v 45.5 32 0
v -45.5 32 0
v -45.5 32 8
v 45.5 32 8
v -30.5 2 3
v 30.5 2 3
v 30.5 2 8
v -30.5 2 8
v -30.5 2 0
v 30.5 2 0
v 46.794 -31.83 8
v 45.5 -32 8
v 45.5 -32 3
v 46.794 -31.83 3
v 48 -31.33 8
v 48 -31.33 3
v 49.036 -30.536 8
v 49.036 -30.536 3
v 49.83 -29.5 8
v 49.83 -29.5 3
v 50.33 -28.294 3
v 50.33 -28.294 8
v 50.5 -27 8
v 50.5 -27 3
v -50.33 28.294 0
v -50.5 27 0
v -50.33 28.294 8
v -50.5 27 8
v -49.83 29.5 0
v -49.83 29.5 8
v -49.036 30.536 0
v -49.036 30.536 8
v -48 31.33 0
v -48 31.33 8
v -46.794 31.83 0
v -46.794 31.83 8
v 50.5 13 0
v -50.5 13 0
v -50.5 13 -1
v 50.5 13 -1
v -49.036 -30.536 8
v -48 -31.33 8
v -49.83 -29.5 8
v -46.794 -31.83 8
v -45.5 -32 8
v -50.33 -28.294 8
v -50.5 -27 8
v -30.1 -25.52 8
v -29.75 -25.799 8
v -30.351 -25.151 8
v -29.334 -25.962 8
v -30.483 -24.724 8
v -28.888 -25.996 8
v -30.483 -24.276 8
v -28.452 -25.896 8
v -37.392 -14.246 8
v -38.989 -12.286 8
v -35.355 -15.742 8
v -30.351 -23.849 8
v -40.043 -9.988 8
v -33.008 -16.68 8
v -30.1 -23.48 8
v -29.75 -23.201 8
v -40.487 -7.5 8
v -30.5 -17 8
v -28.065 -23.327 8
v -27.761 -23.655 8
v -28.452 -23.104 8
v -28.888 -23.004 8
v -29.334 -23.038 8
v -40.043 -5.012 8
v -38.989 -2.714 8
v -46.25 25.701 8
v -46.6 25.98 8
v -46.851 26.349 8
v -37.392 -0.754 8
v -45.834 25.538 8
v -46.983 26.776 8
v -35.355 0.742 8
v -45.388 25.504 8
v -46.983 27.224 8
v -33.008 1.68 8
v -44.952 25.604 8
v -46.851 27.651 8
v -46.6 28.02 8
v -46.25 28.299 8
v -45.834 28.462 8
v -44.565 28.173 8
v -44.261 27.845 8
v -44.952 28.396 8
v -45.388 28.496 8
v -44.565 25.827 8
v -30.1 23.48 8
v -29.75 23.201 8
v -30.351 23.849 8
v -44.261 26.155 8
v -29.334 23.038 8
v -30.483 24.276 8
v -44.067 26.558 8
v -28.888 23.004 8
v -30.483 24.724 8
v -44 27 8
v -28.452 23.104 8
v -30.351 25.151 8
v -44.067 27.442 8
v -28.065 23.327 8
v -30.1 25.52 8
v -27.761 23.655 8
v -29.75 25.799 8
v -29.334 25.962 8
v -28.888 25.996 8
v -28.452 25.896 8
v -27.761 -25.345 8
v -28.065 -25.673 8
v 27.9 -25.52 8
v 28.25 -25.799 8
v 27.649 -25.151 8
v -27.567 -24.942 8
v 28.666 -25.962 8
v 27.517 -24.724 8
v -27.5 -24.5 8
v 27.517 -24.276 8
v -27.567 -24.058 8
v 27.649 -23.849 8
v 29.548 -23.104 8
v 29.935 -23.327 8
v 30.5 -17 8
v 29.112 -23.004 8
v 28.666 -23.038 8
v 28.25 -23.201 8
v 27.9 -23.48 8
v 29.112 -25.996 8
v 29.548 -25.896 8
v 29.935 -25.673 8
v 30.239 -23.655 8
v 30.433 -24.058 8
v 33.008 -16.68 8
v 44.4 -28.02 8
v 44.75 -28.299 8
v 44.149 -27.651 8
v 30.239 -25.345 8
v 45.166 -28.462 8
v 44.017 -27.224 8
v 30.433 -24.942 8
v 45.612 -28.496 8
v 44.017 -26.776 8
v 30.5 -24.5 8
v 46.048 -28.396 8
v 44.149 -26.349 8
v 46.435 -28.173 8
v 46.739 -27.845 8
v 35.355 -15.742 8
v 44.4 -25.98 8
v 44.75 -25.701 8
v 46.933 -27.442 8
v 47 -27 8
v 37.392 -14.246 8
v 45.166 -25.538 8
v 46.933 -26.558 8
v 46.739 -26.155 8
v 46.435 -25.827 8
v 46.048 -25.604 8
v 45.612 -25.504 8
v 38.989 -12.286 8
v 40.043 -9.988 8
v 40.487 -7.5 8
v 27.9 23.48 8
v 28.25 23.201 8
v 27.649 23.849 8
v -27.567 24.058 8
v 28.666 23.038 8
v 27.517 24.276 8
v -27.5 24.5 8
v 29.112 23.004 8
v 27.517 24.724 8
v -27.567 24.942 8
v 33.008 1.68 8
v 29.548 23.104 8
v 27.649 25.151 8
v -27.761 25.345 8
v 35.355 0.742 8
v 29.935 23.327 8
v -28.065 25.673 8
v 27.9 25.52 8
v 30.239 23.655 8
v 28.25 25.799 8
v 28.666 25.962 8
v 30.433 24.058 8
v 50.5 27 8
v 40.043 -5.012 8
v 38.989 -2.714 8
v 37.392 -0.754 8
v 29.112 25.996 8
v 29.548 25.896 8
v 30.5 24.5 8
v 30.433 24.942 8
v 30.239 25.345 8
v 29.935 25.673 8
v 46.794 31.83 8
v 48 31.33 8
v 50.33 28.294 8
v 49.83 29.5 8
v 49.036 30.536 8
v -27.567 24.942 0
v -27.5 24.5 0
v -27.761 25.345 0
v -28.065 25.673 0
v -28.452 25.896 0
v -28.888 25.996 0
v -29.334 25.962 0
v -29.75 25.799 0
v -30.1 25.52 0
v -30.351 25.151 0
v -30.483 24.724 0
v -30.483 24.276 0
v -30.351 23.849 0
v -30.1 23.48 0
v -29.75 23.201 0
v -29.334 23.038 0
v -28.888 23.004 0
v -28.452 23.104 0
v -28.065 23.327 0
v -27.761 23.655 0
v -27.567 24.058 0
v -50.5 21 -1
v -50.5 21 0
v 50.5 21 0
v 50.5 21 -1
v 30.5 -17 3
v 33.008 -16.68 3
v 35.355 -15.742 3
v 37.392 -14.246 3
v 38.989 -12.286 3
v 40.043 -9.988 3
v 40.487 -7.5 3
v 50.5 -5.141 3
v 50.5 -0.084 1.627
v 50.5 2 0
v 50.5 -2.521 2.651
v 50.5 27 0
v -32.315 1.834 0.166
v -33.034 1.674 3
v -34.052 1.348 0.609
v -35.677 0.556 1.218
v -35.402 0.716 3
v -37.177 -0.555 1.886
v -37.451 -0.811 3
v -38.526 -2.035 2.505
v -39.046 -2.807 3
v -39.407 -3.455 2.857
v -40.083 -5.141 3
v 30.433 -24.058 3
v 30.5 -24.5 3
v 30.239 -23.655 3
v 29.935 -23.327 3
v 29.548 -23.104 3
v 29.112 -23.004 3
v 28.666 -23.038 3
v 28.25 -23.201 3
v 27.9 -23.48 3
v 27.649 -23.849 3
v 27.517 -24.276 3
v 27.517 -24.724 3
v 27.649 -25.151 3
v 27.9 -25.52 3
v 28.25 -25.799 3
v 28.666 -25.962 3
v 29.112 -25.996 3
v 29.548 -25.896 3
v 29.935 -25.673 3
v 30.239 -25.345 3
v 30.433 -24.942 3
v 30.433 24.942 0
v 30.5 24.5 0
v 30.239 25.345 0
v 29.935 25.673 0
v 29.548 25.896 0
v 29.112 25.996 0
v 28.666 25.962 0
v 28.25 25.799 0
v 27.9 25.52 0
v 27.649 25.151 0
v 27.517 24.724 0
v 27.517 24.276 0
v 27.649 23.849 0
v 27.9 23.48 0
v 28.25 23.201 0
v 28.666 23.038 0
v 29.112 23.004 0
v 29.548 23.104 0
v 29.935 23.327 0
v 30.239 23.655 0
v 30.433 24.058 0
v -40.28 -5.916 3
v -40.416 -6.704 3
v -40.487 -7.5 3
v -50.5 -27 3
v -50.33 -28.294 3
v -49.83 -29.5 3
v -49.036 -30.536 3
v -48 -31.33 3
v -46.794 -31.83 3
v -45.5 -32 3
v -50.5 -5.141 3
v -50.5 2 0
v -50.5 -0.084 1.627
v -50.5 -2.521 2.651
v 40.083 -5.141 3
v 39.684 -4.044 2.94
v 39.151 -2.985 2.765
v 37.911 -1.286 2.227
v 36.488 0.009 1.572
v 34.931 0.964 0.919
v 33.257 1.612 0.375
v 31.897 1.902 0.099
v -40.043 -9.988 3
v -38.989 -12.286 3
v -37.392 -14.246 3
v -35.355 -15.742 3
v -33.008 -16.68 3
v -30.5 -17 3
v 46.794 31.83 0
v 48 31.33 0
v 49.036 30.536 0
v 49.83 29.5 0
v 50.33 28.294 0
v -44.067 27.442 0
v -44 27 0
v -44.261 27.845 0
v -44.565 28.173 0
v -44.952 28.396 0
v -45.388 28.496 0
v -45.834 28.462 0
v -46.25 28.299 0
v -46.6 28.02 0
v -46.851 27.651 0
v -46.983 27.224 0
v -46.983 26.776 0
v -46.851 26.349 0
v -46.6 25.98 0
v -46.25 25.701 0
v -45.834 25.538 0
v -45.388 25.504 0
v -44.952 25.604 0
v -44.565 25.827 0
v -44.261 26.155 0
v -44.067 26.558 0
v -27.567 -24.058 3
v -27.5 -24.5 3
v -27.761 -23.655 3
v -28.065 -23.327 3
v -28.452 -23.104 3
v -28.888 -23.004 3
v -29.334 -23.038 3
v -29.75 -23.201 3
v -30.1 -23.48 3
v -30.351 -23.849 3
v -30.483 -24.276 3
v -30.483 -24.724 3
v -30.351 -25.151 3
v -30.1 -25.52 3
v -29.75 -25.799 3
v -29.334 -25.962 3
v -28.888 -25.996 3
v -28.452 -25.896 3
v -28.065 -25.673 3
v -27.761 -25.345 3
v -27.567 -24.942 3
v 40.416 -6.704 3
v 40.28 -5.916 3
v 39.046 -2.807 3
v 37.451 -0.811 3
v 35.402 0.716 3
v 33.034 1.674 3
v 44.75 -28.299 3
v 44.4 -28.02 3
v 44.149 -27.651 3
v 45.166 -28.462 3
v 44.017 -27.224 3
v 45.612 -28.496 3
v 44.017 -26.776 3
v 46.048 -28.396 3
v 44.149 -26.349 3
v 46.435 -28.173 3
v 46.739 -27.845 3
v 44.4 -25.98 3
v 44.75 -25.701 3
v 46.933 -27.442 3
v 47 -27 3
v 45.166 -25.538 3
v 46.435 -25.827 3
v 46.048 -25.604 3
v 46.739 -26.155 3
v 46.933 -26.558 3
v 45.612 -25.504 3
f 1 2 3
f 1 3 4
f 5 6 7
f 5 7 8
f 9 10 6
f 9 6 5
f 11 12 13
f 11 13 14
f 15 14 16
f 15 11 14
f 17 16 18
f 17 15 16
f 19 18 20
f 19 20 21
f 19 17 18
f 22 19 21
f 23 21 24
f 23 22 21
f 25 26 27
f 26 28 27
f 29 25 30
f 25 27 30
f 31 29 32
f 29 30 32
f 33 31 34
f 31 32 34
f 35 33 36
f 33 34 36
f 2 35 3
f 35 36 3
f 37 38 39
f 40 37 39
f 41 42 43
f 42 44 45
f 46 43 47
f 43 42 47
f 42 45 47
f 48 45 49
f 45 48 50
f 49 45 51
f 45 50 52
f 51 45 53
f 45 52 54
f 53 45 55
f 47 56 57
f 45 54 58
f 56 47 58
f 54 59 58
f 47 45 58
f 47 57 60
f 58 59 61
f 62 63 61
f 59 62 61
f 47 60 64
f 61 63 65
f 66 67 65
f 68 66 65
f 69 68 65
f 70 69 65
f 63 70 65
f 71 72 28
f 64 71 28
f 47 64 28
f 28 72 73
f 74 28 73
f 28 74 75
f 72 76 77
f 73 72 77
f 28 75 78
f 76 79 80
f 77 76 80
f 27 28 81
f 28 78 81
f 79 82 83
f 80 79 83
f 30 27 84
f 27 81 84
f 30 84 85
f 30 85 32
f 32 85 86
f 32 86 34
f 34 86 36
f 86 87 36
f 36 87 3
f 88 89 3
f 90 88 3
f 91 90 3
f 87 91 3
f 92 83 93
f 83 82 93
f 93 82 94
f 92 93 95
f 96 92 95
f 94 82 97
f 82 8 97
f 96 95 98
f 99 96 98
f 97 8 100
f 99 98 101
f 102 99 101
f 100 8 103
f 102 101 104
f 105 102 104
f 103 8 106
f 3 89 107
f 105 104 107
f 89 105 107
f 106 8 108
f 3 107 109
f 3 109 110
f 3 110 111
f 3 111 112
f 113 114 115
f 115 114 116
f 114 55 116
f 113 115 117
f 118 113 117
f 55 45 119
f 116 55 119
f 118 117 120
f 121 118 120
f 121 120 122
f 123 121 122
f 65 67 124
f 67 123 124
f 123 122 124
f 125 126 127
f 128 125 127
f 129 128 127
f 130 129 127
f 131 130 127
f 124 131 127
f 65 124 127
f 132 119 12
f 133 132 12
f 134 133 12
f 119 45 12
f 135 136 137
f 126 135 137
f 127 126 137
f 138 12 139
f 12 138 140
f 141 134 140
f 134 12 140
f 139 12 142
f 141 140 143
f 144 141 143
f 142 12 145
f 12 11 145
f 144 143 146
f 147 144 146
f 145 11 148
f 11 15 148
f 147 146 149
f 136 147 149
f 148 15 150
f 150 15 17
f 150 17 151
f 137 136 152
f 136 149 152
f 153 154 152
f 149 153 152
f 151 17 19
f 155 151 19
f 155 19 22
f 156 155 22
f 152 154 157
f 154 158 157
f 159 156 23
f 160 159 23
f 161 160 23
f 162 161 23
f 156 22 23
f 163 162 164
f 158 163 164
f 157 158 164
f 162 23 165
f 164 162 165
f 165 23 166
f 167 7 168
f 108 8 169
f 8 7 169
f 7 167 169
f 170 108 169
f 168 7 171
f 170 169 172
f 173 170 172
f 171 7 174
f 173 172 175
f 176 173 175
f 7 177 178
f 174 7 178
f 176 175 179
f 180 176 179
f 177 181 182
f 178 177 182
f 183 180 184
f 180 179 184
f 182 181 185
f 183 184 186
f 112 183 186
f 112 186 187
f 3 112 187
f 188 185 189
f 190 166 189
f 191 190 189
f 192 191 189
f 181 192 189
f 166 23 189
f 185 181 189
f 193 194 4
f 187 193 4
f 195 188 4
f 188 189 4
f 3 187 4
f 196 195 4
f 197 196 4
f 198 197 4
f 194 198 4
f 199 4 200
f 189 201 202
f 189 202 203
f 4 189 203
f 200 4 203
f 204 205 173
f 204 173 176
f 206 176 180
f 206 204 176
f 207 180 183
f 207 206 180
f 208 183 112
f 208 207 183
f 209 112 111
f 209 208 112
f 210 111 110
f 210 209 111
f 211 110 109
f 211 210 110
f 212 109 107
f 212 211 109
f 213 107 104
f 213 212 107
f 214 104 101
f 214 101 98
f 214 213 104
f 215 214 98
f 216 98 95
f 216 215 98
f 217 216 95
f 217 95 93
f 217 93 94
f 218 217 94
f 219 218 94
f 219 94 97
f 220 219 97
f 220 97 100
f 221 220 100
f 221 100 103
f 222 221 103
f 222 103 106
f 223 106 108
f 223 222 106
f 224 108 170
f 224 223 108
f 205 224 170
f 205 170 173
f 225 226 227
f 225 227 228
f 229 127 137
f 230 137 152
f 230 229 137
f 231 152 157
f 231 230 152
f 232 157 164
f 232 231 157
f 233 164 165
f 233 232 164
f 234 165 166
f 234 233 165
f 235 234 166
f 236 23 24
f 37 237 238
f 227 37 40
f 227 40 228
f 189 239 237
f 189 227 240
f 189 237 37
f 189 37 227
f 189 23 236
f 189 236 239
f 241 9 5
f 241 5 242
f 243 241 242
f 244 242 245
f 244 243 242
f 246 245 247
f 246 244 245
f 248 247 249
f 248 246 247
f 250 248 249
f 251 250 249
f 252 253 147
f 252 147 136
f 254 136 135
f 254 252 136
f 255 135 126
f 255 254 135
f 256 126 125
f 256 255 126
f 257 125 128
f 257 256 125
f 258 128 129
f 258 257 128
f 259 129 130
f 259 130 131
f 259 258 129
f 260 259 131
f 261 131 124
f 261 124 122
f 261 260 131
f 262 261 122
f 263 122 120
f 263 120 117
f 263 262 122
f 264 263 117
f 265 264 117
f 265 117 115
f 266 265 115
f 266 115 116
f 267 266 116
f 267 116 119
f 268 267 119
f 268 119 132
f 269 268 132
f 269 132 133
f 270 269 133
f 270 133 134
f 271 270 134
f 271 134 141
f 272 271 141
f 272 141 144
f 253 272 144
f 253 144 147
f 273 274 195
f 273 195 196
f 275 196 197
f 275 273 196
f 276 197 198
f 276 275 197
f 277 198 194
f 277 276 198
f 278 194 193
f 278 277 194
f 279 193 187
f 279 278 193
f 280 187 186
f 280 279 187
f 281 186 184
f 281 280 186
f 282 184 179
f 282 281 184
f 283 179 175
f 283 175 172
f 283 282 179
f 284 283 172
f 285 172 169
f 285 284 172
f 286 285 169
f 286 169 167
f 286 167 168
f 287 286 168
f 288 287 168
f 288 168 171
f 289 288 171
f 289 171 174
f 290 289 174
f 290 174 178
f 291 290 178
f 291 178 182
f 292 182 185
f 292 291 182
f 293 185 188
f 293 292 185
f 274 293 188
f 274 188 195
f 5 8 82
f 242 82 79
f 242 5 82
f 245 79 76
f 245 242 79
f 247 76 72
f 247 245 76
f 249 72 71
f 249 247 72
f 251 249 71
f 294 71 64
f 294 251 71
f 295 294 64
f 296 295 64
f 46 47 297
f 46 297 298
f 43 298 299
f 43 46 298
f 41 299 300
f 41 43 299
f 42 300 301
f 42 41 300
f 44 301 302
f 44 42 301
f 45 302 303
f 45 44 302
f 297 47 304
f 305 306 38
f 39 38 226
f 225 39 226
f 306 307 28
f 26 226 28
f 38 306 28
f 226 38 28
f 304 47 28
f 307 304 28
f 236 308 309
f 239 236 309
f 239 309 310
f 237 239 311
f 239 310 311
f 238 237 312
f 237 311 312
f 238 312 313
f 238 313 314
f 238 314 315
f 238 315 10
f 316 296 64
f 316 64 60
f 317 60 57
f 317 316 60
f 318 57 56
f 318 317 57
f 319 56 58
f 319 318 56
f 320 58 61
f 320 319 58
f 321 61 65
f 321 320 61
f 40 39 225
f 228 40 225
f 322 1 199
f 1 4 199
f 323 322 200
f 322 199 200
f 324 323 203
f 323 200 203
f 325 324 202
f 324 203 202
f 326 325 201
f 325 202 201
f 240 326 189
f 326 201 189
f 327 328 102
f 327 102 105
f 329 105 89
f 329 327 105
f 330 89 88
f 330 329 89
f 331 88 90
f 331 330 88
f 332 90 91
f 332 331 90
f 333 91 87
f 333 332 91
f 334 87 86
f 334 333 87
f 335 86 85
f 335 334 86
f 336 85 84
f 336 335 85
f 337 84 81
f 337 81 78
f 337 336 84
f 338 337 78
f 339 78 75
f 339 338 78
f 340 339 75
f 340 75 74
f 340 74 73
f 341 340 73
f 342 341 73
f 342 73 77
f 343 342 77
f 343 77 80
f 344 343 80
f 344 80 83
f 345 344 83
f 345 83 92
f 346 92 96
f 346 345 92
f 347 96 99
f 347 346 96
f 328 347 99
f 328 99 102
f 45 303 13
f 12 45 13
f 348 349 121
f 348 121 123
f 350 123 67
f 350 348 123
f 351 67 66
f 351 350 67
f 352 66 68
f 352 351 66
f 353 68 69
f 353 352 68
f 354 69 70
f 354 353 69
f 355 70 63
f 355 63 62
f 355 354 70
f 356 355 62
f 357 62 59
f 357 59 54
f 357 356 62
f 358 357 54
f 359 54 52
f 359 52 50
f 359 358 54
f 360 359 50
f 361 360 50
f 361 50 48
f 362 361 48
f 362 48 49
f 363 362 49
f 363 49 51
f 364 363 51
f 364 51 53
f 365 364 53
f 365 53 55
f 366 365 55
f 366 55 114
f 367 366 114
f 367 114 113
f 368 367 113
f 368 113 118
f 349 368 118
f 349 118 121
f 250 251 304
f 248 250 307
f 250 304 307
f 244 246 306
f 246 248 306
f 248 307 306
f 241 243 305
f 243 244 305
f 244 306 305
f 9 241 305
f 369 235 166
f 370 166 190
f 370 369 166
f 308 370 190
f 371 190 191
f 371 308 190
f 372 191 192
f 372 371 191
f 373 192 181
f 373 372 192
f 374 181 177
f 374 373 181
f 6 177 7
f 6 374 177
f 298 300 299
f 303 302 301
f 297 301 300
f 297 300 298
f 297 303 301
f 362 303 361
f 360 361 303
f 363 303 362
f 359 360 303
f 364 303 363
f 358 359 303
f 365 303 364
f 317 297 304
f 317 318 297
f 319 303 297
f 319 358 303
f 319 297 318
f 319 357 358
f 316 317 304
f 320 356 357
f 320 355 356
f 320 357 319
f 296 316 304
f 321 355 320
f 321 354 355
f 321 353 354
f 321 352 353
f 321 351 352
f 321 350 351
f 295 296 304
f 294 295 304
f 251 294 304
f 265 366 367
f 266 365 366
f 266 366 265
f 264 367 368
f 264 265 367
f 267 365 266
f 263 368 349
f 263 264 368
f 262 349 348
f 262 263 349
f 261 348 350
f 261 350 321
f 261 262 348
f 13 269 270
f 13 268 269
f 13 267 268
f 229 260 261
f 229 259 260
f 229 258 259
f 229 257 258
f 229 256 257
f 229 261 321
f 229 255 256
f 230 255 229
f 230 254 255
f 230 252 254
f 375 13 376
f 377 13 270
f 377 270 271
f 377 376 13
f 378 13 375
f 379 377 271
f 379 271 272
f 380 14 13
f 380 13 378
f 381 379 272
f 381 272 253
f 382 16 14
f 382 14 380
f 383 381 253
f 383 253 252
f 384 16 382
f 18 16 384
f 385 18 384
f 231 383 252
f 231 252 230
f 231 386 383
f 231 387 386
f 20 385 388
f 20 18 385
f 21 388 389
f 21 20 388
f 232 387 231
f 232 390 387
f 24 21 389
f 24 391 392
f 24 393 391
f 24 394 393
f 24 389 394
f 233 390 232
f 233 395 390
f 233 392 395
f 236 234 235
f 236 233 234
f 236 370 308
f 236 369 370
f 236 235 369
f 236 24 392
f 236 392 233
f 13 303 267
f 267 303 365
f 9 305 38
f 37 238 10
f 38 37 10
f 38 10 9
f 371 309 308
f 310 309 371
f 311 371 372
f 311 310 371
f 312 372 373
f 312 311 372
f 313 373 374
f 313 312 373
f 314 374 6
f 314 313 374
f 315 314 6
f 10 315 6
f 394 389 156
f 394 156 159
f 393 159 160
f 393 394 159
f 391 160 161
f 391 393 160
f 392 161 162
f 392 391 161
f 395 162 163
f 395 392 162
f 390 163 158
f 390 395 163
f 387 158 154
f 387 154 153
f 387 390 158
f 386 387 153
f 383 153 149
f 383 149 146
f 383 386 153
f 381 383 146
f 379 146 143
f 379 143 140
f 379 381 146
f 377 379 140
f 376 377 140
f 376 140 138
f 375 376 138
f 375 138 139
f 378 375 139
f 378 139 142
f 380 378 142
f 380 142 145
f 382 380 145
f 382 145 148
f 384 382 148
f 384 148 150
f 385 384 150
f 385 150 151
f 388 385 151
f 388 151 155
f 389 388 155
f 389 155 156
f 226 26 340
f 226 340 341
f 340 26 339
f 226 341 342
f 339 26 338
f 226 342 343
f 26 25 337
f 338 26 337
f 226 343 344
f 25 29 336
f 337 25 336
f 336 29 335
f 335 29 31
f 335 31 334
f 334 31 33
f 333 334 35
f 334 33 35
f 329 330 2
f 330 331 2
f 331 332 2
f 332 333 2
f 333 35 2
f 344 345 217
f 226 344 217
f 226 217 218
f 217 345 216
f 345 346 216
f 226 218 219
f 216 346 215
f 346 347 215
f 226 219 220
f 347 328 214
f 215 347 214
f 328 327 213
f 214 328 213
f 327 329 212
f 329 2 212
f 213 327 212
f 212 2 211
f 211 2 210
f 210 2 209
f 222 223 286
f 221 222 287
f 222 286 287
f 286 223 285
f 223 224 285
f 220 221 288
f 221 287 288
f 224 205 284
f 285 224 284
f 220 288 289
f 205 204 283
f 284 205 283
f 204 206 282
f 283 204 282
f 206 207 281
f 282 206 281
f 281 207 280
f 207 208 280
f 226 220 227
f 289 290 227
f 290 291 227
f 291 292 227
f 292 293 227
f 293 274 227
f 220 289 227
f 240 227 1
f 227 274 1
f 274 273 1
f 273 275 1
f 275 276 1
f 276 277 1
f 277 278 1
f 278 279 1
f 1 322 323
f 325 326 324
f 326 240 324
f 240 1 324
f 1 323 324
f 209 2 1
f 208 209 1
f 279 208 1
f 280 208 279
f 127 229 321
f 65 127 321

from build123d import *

# Parameters (mm, degrees)
SKETCH1_W           = 101
SKETCH1_H           = 64
SKETCH1_R           = 1.5
BOSS_EXTRUDE1_DEPTH = 8
SKETCH2_W           = 8
SKETCH2_H           = 1
BOSS_EXTRUDE2_DEPTH = 101
FILLET1_R           = 5
SKETCH3_W           = 81
SKETCH3_H           = 19
CUT_EXTRUDE1_DEPTH  = 61.317907789
FILLET2_R           = 10
SKETCH4_W           = 34
SKETCH4_H           = 3
CUT_EXTRUDE2_DEPTH  = 114.204461043
FILLET3_START       = 39.83238
FILLET3_DEPTH       = 10.66762
FILLET3_START_2     = -50.5
FILLET3_2_DEPTH     = 10.012507722
FILLET3_START_3     = -40.487492278
FILLET3_3_DEPTH     = 9.987492378
FILLET3_START_4     = 30.4999999
FILLET3_4_DEPTH     = 9.3323801
FILLET3_START_5     = -1
FILLET3_5_DEPTH     = 4


with BuildPart() as part:
    # Sketch1 → Boss-Extrude1 (new body)
    with BuildSketch(Plane.XY):
        Rectangle(SKETCH1_W, SKETCH1_H)
        with Locations((-29, 24.5)):
            Circle(SKETCH1_R, mode=Mode.SUBTRACT)
        with Locations((29, 24.5)):
            Circle(SKETCH1_R, mode=Mode.SUBTRACT)
        with Locations((29, -24.5)):
            Circle(SKETCH1_R, mode=Mode.SUBTRACT)
        with Locations((-29, -24.5)):
            Circle(SKETCH1_R, mode=Mode.SUBTRACT)
        with Locations((45.5, -27)):
            Circle(SKETCH1_R, mode=Mode.SUBTRACT)
        with Locations((-45.5, 27)):
            Circle(SKETCH1_R, mode=Mode.SUBTRACT)
    extrude(amount=BOSS_EXTRUDE1_DEPTH)

    # Sketch2 → Boss-Extrude2 (add)
    with BuildSketch(Plane(origin=(-50.5, -4.5, 0), x_dir=(0, 1, 0), z_dir=(-1, 0, 0))):
        with Locations((21.5, 0.5)):
            Rectangle(SKETCH2_W, SKETCH2_H)
    extrude(amount=-BOSS_EXTRUDE2_DEPTH)

    # Fillet1
    fillet1_edges = [part.edges().sort_by_distance(p)[0] for p in [
        (50.5, -32, 4),
        (-50.5, -32, 4),
        (-50.5, 32, 4),
        (50.5, 32, 4),
    ]]
    fillet(fillet1_edges, radius=FILLET1_R)

    # Sketch3 → Cut-Extrude1 (cut, through all)
    with BuildSketch(Plane(origin=(0, 0, 0), x_dir=(-1, 0, 0), z_dir=(0, 0, -1))):
        with Locations((0, -7.5)):
            Rectangle(SKETCH3_W, SKETCH3_H)
    extrude(amount=-CUT_EXTRUDE1_DEPTH, mode=Mode.SUBTRACT)

    # Fillet2
    # the kernel refuses this fillet: 10 mm, written as the material it adds along each edge
    with BuildSketch(Plane(origin=(40.5, -17, 0), x_dir=(-1, 0, 0), z_dir=(0, 0, 1)), Plane(origin=(-40.5, -17, 0), x_dir=(0, 1, 0), z_dir=(0, 0, 1)), Plane(origin=(40.5, 2, 0), x_dir=(0, -1, 0), z_dir=(0, 0, 1))) as fillet2_piece_1:
        with BuildLine():
            CenterArc((FILLET2_R, -FILLET2_R), FILLET2_R, 90, 90)
            Line((0, -FILLET2_R), (0, 0))
            Line((0, 0), (FILLET2_R, 0))
        make_face()
    extrude(amount=8)
    with BuildSketch(Plane(origin=(-40.5, 2, 0), x_dir=(0, -1, 0), z_dir=(0, 0, 1))) as fillet2_piece_2:
        with BuildLine():
            CenterArc((FILLET2_R, FILLET2_R), FILLET2_R, 180, 90)
            Line((0, FILLET2_R), (0, 0))
            Line((0, 0), (FILLET2_R, 0))
        make_face()
    extrude(amount=8)

    # Sketch4 → Cut-Extrude2 (cut, through all)
    with BuildSketch(Plane(origin=(50.5, -18.5, 0), x_dir=(0, 1, 0), z_dir=(-1, 0, 0))):
        with Locations((3.5, -1.5)):
            Rectangle(SKETCH4_W, SKETCH4_H)
    extrude(amount=CUT_EXTRUDE2_DEPTH, mode=Mode.SUBTRACT)

    # Fillet3: read off the stored shape, not the designer's step
    # Fillet3 outline → Fillet3 (add)
    with BuildSketch(Plane.YZ.offset(FILLET3_START)):
        with BuildLine():
            Line((2, 3), (-5.141428429, 3))
            ThreePointArc((-5.141428429, 3), (-1.268444058, 2.219544027), (2.000001555, -1.587e-06))
            Line((2.000001555, -1.587e-06), (2, 3))
        make_face()
    extrude(amount=FILLET3_DEPTH)

    # Fillet3 2 outline → Fillet3 2 (add)
    with BuildSketch(Plane.YZ.offset(FILLET3_START_2)):
        with BuildLine():
            Line((2, 3), (-5.141428429, 3))
            ThreePointArc((-5.141428429, 3), (-1.268444058, 2.219544027), (2.000001555, -1.587e-06))
            Line((2.000001555, -1.587e-06), (2, 3))
        make_face()
    extrude(amount=FILLET3_2_DEPTH)

    # Fillet3 3 outline → Fillet3 3 (add)
    with BuildSketch(Plane.YZ.offset(FILLET3_START_3)):
        with BuildLine():
            Line((2, 3), (-5.141428429, 3))
            ThreePointArc((-5.141428429, 3), (-1.268444058, 2.219544027), (2.000001555, -1.587e-06))
            Line((2.000001555, -1.587e-06), (2, 3))
        make_face()
    extrude(amount=FILLET3_3_DEPTH)

    # Fillet3 4 outline → Fillet3 4 (add)
    with BuildSketch(Plane.YZ.offset(FILLET3_START_4)):
        with BuildLine():
            Line((2, 3), (-5.141428429, 3))
            ThreePointArc((-5.141428429, 3), (-1.268444058, 2.219544027), (2.000001555, -1.587e-06))
            Line((2.000001555, -1.587e-06), (2, 3))
        make_face()
    extrude(amount=FILLET3_4_DEPTH)

    # Fillet3 5 outline → Fillet3 5 (cut)
    with BuildSketch(Plane.XY.offset(FILLET3_START_5)):
        with BuildLine():
            Line((30.4999999, -7), (40.449874371, -7))
            ThreePointArc((40.449874371, -7), (37.208203932, -0.583801513), (30.5, 2))
            Line((30.5, 2), (30.4999999, -7))
        make_face()
        with BuildLine():
            Line((-40.449874371, -7), (-30.4999999, -7))
            Line((-30.4999999, -7), (-30.5, 2))
            ThreePointArc((-30.5, 2), (-37.208203932, -0.583801513), (-40.449874371, -7))
        make_face()
    extrude(amount=FILLET3_5_DEPTH, mode=Mode.SUBTRACT)


solid = part.part
